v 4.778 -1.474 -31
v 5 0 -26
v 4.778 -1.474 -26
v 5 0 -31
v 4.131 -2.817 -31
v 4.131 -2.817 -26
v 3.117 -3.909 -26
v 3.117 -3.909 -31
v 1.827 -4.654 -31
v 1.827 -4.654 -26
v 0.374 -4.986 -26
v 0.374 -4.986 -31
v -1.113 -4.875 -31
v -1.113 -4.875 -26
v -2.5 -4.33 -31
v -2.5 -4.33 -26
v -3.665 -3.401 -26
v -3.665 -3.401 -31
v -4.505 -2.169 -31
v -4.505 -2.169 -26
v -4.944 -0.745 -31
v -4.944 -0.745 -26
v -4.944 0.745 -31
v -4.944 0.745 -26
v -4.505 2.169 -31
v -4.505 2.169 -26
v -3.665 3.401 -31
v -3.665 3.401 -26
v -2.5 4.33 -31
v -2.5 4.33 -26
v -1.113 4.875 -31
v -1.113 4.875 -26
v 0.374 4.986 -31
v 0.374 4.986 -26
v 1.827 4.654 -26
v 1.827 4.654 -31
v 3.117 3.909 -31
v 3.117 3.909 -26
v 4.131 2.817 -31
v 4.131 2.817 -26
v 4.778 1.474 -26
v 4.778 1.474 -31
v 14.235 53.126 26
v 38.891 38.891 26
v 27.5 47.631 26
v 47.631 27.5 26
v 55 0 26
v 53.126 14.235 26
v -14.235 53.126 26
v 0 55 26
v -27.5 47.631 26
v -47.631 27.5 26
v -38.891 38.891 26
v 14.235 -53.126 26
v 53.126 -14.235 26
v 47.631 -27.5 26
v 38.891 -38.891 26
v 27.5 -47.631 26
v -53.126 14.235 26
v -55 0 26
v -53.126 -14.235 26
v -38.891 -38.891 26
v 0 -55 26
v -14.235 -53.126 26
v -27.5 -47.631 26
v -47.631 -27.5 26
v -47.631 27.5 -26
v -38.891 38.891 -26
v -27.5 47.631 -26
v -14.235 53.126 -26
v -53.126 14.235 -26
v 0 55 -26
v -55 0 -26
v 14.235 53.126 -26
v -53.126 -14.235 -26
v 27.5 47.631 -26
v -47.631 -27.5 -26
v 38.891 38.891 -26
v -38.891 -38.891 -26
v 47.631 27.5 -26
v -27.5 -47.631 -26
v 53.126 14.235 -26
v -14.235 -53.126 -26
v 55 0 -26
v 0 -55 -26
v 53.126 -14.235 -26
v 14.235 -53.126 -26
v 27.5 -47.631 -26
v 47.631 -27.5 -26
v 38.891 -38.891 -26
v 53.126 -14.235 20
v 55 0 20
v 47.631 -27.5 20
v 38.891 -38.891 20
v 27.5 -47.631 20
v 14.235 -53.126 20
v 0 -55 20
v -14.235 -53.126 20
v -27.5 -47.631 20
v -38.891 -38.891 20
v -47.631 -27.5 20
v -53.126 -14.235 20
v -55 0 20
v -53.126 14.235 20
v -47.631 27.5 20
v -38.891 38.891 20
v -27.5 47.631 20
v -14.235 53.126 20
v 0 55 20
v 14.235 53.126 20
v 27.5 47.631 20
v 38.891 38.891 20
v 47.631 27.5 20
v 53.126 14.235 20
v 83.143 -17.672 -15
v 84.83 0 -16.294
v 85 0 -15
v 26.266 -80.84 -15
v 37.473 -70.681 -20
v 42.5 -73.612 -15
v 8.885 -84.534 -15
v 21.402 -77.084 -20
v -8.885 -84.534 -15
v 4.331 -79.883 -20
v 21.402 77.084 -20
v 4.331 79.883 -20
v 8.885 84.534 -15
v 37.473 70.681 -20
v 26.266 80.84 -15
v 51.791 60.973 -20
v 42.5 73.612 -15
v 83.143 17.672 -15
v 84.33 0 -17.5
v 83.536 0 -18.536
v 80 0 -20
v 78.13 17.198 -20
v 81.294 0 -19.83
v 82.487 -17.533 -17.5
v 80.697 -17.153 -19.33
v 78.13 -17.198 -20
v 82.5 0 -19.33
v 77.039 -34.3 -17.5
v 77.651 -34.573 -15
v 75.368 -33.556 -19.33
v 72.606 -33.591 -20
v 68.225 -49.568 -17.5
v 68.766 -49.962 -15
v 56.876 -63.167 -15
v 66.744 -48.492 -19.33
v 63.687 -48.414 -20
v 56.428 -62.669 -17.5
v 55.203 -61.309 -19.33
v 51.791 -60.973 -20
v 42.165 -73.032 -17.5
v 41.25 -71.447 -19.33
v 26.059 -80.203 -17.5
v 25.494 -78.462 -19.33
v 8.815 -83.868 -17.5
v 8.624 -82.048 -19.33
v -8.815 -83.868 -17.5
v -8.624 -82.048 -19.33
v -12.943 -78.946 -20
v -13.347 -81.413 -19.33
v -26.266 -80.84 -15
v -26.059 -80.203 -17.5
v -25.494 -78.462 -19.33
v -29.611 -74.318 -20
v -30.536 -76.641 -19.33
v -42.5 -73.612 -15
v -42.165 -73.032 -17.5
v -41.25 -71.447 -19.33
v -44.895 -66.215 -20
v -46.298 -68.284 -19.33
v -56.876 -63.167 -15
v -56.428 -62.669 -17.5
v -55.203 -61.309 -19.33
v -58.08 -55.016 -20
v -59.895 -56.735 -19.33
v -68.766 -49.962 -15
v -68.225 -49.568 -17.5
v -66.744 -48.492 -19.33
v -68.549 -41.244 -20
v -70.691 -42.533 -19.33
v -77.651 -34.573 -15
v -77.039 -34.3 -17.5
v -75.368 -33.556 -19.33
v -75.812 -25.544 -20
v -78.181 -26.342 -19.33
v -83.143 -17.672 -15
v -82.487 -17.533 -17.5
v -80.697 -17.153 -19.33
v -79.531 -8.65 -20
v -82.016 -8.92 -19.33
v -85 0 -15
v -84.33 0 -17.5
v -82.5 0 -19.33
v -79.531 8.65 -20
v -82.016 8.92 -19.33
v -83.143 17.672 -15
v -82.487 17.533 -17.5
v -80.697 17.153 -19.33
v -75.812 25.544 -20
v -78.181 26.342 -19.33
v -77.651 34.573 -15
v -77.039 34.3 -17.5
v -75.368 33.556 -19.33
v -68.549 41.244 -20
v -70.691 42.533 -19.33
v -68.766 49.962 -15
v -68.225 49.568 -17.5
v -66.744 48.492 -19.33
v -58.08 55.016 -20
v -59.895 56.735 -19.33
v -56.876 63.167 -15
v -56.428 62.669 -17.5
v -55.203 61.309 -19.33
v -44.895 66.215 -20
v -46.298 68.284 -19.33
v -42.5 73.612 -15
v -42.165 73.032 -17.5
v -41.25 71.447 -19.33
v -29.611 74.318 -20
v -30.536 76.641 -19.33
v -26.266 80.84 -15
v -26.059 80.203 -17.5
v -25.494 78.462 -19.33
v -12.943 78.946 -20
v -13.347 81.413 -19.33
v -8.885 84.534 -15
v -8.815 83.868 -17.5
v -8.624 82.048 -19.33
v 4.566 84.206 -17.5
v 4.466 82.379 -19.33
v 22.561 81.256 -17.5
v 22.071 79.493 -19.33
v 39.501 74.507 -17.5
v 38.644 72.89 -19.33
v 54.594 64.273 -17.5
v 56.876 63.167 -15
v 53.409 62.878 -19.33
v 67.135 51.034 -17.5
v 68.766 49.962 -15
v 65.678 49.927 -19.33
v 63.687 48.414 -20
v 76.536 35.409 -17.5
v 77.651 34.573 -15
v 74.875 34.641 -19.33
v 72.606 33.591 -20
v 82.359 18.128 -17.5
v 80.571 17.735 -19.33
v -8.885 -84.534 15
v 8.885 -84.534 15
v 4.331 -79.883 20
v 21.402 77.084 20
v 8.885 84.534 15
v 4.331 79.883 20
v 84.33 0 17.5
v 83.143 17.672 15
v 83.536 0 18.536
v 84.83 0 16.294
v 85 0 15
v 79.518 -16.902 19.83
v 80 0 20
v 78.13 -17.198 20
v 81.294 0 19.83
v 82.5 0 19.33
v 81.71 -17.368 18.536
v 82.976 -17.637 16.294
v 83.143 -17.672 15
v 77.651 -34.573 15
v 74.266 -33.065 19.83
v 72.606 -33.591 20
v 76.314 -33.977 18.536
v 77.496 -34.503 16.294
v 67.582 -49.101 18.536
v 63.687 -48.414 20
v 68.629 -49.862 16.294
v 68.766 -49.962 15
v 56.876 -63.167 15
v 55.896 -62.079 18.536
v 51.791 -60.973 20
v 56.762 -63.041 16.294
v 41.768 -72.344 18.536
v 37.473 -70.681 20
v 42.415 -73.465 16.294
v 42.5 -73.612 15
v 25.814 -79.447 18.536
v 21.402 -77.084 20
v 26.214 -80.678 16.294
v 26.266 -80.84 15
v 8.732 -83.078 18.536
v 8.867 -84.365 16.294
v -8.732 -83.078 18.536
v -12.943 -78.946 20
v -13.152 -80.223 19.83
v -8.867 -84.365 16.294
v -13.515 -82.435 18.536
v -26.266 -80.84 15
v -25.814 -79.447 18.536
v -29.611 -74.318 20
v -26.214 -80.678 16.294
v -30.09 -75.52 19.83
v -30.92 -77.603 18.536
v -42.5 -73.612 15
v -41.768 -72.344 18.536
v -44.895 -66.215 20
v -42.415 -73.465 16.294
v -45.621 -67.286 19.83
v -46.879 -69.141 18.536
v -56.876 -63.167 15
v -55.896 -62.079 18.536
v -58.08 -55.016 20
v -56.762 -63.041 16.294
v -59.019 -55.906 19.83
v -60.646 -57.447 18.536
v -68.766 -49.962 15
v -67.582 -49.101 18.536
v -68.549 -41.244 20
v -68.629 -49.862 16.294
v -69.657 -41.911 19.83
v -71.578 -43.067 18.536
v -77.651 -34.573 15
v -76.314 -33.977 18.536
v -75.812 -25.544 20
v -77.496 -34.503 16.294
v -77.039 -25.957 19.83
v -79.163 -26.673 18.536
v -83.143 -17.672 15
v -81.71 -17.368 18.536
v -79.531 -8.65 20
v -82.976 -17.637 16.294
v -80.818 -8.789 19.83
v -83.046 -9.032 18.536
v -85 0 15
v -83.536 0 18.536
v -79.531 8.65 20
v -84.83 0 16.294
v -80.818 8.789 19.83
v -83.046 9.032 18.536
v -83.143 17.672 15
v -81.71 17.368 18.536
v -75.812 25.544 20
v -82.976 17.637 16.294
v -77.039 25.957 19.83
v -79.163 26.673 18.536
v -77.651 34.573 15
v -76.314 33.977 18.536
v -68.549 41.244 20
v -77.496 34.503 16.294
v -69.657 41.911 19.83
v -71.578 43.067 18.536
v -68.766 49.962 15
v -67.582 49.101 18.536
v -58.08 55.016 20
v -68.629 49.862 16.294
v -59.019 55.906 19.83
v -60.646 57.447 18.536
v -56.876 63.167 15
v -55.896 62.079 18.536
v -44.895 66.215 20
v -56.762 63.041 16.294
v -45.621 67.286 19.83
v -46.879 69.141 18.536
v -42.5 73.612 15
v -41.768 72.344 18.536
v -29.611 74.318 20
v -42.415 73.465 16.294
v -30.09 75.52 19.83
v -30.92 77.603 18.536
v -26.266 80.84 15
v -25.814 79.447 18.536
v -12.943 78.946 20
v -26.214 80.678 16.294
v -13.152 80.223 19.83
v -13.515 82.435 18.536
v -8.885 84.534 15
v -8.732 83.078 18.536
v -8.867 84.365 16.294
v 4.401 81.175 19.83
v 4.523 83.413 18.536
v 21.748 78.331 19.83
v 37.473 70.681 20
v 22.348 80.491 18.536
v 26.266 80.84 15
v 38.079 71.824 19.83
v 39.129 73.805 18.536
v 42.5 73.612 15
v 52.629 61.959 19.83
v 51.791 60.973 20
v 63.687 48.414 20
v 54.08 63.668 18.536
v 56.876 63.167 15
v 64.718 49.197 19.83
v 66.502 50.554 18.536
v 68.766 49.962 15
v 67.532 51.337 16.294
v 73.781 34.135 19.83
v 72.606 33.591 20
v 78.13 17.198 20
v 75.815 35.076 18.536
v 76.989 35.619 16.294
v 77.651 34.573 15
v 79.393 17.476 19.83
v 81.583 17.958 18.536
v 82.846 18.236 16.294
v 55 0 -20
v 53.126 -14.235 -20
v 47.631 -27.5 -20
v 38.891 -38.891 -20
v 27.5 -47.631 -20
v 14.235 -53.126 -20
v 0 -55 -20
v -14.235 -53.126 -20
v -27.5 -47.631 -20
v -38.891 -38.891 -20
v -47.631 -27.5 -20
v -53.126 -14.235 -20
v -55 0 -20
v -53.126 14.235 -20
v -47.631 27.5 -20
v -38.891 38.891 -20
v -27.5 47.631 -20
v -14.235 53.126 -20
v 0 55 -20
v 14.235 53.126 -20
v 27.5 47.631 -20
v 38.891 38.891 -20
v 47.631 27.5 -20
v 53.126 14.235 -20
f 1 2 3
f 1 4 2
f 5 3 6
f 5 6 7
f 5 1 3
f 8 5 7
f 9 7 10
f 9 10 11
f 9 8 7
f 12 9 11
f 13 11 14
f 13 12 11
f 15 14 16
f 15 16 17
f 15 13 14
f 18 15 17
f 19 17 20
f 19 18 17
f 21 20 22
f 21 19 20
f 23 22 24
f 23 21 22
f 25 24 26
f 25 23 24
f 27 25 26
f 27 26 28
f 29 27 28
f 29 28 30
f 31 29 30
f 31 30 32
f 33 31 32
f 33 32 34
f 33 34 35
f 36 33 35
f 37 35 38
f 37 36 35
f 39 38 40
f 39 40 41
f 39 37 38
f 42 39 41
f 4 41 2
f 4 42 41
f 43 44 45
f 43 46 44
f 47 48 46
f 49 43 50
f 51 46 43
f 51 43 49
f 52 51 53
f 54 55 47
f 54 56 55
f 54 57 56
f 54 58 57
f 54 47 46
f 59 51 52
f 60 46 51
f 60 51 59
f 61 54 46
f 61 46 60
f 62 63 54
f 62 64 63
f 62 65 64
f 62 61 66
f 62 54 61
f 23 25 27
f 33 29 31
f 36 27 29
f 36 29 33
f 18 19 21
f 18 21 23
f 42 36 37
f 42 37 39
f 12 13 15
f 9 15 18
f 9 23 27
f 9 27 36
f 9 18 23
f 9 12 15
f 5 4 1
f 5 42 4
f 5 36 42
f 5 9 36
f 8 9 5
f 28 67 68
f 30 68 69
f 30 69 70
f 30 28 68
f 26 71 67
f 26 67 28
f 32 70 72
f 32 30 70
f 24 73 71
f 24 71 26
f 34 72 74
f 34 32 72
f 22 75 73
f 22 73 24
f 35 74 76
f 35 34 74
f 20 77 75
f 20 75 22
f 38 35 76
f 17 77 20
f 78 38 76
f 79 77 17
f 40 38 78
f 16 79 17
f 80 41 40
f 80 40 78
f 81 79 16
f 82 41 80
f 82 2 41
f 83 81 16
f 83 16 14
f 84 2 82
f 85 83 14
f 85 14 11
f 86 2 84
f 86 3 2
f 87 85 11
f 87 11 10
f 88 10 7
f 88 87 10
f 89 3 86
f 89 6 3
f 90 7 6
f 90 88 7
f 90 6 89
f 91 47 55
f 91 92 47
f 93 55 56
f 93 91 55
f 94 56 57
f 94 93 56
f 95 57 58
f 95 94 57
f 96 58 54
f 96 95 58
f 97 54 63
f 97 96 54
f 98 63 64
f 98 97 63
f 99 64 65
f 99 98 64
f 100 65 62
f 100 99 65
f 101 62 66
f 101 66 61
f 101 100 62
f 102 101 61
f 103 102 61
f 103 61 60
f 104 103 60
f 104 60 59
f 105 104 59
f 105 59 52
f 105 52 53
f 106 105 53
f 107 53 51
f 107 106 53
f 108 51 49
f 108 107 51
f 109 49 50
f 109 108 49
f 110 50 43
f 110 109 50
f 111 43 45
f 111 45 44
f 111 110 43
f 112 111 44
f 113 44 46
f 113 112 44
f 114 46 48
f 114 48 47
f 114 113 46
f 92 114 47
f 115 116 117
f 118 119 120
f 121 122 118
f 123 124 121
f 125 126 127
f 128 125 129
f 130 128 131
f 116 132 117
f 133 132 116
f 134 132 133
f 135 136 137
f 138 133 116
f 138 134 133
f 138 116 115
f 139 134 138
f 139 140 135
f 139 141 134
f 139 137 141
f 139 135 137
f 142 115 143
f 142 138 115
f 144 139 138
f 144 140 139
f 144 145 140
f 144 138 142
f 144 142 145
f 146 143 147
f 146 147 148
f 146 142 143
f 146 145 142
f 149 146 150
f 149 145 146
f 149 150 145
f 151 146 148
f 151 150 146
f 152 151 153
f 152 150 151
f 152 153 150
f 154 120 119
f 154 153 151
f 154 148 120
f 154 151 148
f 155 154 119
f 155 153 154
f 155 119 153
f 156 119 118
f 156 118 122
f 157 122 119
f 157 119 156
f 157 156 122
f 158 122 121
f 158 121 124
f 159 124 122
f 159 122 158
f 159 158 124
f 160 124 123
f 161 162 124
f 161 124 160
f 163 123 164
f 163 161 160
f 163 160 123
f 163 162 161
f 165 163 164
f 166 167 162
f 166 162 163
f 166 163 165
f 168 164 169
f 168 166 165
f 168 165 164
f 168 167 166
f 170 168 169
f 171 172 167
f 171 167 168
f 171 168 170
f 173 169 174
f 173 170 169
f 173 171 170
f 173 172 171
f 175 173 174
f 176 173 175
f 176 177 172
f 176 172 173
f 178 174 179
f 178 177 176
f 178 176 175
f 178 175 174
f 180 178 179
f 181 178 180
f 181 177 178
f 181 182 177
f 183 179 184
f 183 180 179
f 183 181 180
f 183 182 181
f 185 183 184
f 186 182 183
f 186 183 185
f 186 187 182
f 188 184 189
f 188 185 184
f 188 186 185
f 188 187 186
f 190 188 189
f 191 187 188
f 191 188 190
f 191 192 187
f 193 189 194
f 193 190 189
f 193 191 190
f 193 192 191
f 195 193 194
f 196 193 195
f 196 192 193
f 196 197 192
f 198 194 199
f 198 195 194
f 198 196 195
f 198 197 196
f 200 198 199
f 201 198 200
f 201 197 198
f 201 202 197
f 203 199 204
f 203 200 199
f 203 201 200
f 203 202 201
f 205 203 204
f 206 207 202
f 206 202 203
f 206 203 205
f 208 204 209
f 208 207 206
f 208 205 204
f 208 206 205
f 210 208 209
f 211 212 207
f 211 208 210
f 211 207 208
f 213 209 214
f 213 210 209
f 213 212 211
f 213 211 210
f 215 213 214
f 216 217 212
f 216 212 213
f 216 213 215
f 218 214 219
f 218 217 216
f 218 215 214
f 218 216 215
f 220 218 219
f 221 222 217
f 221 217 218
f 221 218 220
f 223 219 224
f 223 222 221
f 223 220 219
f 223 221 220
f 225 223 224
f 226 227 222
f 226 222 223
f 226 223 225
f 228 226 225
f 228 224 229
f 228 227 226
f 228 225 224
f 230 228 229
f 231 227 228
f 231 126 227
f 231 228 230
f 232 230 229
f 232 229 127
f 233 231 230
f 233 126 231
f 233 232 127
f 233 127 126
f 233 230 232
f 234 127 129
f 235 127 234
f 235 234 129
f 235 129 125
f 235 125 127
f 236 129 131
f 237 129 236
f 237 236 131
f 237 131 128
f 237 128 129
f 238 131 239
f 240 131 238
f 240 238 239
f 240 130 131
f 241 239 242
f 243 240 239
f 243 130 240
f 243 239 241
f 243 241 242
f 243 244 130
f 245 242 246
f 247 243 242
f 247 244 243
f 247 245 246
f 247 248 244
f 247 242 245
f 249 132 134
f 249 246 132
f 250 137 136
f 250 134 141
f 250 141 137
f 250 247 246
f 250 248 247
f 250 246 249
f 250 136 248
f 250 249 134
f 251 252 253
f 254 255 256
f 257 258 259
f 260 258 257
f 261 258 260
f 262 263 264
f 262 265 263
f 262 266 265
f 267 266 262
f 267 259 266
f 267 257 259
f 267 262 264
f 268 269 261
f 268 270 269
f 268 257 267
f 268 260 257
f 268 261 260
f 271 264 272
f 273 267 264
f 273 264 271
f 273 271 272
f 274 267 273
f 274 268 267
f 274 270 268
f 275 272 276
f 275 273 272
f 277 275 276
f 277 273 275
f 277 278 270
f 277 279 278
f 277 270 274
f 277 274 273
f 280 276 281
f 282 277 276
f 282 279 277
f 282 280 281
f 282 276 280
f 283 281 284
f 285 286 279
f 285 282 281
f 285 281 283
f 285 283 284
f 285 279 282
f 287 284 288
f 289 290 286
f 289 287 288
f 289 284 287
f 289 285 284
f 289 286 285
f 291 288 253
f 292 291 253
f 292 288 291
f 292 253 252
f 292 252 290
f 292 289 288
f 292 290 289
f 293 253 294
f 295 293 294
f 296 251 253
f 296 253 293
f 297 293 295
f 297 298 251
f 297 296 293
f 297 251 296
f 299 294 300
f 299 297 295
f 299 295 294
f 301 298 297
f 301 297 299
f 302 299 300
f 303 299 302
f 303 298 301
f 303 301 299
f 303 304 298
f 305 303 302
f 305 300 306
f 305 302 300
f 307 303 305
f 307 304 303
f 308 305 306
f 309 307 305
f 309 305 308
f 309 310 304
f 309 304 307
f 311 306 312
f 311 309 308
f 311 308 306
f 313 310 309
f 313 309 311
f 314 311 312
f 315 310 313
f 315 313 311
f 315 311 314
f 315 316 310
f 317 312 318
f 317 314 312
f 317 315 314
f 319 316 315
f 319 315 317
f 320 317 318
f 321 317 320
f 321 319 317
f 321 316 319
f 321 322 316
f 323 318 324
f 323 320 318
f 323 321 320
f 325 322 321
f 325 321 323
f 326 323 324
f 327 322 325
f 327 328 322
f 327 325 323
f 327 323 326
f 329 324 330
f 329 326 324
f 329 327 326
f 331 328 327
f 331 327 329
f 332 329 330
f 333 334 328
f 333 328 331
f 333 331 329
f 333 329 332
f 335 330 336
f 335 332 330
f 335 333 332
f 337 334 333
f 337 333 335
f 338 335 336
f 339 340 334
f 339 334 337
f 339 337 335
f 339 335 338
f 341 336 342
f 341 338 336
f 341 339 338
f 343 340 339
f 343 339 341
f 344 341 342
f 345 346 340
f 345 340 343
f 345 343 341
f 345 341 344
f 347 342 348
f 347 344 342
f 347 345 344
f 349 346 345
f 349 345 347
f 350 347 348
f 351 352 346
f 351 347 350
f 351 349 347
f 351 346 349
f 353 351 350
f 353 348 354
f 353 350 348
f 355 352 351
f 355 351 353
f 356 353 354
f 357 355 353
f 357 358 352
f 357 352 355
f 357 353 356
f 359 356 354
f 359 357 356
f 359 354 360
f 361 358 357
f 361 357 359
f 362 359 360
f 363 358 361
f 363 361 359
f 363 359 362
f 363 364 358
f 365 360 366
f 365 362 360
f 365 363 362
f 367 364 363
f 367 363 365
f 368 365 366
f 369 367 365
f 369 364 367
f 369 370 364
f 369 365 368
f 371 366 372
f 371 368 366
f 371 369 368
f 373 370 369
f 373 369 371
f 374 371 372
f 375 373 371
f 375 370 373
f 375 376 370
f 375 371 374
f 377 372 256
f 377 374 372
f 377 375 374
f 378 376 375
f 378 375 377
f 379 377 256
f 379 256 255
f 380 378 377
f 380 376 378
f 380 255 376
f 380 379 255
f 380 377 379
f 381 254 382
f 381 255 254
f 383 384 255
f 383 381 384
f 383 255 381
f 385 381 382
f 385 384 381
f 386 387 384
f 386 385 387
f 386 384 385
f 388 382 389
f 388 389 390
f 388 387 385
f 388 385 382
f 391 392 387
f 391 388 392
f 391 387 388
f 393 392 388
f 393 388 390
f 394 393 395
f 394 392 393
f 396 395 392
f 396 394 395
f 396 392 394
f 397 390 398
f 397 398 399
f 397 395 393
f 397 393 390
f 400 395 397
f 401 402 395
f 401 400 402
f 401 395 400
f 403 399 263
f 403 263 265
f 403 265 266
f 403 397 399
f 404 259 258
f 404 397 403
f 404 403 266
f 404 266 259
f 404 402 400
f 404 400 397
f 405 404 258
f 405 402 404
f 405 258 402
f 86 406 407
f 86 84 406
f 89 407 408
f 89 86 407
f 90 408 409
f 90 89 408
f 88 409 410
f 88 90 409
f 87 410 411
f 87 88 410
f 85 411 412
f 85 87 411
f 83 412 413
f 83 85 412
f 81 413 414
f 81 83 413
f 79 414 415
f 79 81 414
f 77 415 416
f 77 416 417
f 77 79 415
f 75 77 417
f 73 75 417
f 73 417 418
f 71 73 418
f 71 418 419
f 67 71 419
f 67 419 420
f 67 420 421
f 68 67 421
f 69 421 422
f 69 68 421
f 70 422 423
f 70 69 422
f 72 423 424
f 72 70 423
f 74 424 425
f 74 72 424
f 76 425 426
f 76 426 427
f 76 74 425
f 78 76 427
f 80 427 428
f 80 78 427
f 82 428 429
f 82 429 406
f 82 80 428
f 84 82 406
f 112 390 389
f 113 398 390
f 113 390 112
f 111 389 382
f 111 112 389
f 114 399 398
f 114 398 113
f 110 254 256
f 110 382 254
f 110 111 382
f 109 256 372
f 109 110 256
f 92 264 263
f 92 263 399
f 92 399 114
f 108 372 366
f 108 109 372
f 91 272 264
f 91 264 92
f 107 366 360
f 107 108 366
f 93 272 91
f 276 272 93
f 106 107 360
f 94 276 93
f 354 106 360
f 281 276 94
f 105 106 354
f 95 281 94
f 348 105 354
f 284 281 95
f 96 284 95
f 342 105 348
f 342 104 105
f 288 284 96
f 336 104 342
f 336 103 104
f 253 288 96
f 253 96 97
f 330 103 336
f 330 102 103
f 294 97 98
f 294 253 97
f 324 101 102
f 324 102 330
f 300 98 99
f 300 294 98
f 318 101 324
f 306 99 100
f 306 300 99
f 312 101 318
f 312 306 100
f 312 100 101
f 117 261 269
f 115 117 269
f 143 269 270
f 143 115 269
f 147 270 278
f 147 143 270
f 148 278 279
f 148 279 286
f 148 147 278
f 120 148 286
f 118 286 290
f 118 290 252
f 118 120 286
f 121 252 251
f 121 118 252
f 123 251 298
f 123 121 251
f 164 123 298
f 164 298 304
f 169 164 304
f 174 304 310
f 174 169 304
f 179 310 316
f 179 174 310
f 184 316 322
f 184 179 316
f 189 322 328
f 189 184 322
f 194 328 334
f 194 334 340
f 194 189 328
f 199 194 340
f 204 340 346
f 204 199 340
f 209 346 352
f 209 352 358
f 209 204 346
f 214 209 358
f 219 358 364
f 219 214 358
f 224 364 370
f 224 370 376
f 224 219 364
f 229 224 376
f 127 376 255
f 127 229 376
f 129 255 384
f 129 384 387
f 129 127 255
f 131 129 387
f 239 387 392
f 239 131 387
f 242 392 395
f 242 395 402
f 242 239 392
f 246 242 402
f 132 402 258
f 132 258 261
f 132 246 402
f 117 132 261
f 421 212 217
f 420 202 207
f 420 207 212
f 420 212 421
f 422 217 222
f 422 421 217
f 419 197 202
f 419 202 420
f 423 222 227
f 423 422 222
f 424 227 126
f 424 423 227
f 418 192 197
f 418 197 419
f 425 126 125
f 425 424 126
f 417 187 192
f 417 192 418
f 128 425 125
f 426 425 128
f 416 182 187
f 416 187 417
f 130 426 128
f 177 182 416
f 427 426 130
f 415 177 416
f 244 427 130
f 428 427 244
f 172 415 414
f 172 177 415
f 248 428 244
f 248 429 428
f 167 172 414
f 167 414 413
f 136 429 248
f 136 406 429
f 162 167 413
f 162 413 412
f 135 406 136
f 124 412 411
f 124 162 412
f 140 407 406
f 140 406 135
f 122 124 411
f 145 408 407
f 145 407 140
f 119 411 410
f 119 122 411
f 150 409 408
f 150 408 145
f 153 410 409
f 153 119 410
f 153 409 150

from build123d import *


with BuildPart() as part:
    # 草图1 → 旋转1 (revolve)
    with BuildSketch(Plane(origin=(0, 0, 0), x_dir=(1, 0, 0), z_dir=(0, 1, 0))):
        with BuildLine():
            Line((0, 31), (0, 26))
            Line((0, 26), (0, -26))
            Line((0, -26), (55, -26))
            Line((55, -26), (55, -20))
            Line((55, -20), (80, -20))
            ThreePointArc((80, -20), (83.535533906, -18.535533906), (85, -15))
            Line((85, -15), (85, 15))
            ThreePointArc((85, 15), (83.535533906, 18.535533906), (80, 20))
            Line((80, 20), (55, 20))
            Line((55, 20), (55, 26))
            Line((55, 26), (5, 26))
            Line((5, 26), (5, 31))
            Line((5, 31), (0, 31))
        make_face()
    revolve(axis=Axis((0, 0, -26), (0, 0, -1)))


solid = part.part
